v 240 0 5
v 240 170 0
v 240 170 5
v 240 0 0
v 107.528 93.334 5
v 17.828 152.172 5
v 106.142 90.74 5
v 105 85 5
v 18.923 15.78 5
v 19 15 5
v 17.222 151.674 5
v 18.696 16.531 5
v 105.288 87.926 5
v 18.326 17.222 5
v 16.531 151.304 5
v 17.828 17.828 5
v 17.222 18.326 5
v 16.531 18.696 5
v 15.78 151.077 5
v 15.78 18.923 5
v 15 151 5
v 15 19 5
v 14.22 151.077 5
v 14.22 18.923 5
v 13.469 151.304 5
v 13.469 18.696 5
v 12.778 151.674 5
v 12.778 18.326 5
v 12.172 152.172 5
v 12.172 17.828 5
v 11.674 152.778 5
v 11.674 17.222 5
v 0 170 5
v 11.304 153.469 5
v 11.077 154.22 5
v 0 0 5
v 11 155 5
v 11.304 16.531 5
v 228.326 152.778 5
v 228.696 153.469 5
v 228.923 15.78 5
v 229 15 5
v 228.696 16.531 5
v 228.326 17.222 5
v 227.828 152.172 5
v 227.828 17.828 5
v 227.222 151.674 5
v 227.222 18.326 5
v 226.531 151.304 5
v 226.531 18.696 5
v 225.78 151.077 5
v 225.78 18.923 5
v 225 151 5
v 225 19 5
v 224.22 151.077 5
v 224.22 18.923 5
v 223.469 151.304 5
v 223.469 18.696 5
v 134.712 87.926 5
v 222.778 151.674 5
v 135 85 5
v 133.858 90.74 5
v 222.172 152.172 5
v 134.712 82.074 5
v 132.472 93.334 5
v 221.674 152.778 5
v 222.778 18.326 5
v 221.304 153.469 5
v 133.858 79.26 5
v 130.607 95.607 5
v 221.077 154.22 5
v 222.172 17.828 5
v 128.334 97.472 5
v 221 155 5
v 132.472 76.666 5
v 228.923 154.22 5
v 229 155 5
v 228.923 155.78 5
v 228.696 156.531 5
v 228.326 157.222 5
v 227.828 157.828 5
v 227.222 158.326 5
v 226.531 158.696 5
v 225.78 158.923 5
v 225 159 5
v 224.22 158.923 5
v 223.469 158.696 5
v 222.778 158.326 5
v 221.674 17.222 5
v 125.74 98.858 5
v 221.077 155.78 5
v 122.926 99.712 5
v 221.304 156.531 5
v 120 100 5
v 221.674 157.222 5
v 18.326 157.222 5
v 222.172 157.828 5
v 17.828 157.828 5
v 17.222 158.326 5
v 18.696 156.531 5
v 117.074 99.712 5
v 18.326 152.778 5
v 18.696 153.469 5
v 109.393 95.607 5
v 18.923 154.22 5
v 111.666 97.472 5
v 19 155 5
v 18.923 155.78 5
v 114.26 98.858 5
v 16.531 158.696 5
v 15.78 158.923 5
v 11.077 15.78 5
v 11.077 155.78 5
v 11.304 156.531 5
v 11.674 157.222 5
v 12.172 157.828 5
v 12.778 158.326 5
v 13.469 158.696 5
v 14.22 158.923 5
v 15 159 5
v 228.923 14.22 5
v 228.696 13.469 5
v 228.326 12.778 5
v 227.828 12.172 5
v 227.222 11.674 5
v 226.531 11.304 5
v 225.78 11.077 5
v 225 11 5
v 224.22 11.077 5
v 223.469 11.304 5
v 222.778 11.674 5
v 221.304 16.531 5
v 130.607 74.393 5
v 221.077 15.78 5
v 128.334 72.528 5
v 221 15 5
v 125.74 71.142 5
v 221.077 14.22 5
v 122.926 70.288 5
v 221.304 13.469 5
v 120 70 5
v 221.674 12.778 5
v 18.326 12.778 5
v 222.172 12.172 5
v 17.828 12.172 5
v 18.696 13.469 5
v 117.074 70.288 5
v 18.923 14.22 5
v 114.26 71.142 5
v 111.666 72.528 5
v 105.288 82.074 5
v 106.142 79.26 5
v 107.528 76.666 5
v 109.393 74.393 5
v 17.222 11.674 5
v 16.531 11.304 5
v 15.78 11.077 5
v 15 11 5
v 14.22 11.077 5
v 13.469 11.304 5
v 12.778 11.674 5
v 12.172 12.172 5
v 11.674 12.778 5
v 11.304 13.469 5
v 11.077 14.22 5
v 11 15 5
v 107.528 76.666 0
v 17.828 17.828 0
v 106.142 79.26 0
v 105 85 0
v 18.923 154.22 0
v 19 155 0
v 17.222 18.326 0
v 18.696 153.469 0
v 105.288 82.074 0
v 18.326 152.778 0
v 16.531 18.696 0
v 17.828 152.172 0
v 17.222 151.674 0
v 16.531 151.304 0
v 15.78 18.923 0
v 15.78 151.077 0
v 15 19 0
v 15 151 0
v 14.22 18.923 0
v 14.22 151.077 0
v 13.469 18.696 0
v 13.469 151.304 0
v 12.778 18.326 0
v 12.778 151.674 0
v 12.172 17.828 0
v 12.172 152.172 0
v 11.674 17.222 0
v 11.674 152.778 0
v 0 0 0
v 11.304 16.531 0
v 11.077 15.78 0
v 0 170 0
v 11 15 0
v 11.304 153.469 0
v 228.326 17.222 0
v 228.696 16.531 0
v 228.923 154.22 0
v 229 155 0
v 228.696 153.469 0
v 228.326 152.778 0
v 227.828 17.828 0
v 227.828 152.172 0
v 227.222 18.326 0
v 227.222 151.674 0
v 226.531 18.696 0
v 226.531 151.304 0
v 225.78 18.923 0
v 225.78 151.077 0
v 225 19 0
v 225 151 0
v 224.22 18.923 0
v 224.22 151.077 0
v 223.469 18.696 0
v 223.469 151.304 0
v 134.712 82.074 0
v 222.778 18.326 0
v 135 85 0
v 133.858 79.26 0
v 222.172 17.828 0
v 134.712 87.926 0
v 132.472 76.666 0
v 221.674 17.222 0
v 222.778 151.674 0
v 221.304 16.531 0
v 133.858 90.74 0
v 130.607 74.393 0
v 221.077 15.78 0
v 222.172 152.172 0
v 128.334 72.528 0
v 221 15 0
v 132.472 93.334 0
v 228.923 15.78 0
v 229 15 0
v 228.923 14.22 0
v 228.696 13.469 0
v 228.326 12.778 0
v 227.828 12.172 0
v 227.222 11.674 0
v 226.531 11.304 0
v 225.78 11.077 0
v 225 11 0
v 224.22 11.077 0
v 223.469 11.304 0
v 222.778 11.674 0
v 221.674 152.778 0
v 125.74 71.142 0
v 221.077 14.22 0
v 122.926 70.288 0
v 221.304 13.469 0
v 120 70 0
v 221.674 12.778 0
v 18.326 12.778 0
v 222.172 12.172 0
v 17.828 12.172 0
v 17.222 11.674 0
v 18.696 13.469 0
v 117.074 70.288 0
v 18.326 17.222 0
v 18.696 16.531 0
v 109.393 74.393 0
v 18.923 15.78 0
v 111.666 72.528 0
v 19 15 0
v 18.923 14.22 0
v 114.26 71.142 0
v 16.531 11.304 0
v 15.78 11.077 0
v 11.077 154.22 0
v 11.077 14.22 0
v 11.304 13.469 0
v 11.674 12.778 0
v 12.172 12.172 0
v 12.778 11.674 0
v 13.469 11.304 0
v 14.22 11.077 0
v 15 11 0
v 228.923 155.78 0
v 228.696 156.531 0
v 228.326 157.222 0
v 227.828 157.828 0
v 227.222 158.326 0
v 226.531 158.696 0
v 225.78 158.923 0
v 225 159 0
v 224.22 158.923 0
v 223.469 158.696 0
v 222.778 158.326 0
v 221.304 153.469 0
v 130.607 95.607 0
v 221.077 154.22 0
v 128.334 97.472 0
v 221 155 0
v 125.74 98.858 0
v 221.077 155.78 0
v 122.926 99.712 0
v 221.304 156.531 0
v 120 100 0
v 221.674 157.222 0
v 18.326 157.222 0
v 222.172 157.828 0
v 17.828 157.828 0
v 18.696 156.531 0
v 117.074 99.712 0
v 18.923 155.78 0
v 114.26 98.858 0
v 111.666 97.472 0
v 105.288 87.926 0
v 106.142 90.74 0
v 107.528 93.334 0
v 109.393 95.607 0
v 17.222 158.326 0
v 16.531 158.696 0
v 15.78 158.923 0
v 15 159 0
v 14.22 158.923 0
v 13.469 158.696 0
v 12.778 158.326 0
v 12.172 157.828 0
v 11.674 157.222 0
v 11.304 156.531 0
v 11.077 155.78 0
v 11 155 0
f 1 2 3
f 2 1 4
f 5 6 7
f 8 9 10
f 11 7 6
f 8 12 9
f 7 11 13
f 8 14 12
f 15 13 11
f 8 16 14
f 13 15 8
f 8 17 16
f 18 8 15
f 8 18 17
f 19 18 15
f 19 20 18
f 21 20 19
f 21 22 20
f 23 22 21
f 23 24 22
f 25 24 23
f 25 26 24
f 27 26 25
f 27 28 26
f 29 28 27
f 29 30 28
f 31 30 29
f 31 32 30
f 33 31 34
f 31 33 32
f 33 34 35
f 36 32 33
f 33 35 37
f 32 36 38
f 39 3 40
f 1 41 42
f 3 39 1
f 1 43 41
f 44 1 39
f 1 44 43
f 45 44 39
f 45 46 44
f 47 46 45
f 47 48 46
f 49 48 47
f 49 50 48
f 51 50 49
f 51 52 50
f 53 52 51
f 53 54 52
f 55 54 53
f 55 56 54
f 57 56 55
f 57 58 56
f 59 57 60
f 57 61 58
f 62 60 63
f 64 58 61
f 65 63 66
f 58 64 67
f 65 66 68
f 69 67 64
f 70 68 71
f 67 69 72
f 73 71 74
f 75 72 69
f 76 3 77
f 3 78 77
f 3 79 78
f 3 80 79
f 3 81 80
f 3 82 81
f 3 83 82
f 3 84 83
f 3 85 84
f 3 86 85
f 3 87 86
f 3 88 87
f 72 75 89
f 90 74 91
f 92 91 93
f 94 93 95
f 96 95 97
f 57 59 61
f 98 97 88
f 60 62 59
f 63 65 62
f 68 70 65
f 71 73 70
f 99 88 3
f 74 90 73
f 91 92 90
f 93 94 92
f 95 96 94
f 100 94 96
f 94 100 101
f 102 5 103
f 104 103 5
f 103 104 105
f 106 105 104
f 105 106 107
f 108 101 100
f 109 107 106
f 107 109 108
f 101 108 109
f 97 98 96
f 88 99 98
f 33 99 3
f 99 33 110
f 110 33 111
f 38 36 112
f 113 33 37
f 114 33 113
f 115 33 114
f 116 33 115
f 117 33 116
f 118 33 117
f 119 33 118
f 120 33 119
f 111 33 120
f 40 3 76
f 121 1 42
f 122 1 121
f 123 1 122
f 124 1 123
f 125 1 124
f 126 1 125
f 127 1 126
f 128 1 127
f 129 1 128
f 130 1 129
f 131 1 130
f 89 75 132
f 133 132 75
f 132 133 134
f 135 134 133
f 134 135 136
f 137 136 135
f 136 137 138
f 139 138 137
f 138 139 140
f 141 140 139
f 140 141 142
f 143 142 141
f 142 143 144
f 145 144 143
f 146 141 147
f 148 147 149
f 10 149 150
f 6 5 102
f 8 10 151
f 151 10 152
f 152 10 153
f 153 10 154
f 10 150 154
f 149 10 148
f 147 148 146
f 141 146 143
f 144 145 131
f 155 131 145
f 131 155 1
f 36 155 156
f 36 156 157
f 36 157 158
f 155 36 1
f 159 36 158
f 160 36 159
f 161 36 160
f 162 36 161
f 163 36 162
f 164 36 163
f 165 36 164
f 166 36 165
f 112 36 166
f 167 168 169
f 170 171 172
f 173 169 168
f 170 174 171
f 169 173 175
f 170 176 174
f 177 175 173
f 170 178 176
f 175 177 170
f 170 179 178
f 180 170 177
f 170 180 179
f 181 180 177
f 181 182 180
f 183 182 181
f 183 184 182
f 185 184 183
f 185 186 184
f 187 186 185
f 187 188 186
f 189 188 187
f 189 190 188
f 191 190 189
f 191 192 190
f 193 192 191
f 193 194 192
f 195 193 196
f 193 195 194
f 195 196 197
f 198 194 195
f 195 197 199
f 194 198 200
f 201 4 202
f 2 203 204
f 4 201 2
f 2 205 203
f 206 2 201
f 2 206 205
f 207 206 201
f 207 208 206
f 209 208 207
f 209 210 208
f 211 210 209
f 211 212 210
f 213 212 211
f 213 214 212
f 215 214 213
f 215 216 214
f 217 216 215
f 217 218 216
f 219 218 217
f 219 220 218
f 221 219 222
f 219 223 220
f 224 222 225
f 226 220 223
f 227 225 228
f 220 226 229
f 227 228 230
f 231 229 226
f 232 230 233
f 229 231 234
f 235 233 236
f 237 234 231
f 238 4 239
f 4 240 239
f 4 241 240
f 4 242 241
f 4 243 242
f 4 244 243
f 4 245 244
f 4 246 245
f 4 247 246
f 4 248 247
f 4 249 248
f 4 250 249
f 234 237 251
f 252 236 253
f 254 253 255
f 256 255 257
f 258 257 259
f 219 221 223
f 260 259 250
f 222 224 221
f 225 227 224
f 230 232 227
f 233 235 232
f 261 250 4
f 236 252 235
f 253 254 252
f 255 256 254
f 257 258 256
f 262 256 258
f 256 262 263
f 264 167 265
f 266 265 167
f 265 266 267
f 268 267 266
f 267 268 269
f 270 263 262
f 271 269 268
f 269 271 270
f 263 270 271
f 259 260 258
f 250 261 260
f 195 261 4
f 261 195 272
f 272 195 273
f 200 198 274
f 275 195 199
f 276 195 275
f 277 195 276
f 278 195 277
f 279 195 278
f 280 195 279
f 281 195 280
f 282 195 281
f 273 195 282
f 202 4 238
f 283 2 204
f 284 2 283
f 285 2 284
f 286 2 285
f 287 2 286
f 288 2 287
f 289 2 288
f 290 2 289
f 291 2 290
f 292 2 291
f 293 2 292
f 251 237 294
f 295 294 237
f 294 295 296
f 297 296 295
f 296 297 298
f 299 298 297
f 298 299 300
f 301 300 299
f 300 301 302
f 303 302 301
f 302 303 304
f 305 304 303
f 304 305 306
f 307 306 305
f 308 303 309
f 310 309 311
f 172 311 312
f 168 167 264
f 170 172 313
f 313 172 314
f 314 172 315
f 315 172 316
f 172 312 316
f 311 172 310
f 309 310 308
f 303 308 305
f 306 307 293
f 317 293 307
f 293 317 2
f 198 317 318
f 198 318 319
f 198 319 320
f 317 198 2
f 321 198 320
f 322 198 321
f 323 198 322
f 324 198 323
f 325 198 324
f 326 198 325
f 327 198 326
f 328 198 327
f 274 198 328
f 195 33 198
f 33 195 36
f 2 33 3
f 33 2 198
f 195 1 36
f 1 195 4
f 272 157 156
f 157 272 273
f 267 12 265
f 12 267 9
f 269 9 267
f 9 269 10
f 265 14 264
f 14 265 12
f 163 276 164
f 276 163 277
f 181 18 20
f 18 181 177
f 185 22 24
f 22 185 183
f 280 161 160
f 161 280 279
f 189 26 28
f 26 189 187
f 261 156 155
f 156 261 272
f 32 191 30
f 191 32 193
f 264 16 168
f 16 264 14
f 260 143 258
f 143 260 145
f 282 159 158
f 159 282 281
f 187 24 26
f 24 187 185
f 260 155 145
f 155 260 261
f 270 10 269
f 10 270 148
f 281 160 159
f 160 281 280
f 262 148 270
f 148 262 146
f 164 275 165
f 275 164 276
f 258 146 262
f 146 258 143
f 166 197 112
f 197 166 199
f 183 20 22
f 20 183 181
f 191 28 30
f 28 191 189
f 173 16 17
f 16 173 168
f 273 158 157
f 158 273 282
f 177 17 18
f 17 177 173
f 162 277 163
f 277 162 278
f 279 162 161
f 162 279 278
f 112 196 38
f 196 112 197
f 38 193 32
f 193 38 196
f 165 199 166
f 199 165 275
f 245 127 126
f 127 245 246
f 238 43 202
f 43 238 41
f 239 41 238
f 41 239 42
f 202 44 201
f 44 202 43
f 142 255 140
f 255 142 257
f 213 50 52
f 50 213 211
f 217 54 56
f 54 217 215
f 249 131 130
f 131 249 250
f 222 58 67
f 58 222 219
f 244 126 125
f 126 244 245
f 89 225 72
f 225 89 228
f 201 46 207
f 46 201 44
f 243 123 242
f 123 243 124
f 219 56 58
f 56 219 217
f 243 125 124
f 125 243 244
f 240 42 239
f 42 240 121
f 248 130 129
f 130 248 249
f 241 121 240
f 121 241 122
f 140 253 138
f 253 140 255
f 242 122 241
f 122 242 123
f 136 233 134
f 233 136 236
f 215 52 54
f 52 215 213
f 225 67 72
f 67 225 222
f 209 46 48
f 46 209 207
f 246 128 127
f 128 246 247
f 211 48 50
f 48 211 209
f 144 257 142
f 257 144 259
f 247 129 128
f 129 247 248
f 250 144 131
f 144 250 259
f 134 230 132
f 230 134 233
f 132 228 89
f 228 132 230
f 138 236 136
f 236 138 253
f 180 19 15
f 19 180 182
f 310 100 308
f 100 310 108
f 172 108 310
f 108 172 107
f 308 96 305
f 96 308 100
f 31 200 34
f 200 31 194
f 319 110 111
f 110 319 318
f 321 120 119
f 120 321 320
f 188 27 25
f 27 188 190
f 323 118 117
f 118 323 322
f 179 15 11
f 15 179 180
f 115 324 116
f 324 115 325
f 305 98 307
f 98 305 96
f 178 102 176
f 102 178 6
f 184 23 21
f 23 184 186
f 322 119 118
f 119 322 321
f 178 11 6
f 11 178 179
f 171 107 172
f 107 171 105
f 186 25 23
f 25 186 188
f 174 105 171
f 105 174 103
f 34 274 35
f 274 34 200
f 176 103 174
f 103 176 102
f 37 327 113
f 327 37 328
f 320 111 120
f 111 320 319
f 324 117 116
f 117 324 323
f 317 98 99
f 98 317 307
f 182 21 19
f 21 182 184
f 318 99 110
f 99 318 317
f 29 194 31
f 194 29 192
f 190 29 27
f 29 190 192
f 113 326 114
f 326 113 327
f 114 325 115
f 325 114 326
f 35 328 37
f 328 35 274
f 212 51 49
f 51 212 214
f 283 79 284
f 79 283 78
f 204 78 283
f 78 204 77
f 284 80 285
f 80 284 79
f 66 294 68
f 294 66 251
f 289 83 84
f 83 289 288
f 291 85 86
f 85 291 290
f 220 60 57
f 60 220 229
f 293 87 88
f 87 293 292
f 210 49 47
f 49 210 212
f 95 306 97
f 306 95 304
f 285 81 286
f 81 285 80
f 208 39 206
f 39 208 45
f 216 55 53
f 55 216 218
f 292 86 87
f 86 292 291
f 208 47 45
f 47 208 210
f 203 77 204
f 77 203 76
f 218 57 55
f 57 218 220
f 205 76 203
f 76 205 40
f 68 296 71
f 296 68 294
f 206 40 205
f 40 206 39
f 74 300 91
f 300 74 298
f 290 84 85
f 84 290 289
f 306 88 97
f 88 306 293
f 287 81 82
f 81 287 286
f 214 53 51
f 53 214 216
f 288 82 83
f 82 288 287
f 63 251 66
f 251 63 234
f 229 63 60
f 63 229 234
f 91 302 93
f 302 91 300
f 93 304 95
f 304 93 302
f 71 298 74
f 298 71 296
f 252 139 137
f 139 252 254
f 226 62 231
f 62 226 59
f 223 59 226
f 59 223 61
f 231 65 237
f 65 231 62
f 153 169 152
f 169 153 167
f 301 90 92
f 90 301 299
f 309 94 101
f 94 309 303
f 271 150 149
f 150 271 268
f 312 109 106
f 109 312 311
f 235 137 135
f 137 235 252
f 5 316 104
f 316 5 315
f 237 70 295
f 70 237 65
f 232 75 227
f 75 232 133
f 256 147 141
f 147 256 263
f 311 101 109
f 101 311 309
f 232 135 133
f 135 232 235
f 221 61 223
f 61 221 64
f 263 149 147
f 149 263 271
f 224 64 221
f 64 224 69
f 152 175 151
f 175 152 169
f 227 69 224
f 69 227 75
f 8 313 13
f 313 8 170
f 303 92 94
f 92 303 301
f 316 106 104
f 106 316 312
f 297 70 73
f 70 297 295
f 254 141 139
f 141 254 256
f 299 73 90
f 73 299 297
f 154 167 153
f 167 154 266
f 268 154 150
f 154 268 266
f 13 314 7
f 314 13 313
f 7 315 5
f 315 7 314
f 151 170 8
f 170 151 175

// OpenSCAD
$fn = 32;

// ----------------------------------------------------------------------
// Big plate: 200-250 mm adapter plate
// ----------------------------------------------------------------------

// --- parameters (mm) ---
plate_l = 240;            // plate length, X
plate_w = 170;            // plate width, Y
plate_t = 5;              // plate thickness, Z
corner_d = 8;             // corner hole diameter
corner_in = 15;           // corner hole inset from the edges
bore_d = 30;              // central bore
fit_tol = 0.1;            // tolerance for press fits, mm
free_tol = 0.3;           // tolerance for clearance fits, mm

difference() {
  cube([plate_l, plate_w, plate_t]);
  translate([corner_in, corner_in, -1]) cylinder(h = plate_t + 2, d = corner_d);
  translate([plate_l - corner_in, corner_in, -1]) cylinder(h = plate_t + 2, d = corner_d);
  translate([corner_in, plate_w - corner_in, -1]) cylinder(h = plate_t + 2, d = corner_d);
  translate([plate_l - corner_in, plate_w - corner_in, -1]) cylinder(h = plate_t + 2, d = corner_d);
  translate([plate_l / 2, plate_w / 2, -1]) cylinder(h = plate_t + 2, d = bore_d);
}
